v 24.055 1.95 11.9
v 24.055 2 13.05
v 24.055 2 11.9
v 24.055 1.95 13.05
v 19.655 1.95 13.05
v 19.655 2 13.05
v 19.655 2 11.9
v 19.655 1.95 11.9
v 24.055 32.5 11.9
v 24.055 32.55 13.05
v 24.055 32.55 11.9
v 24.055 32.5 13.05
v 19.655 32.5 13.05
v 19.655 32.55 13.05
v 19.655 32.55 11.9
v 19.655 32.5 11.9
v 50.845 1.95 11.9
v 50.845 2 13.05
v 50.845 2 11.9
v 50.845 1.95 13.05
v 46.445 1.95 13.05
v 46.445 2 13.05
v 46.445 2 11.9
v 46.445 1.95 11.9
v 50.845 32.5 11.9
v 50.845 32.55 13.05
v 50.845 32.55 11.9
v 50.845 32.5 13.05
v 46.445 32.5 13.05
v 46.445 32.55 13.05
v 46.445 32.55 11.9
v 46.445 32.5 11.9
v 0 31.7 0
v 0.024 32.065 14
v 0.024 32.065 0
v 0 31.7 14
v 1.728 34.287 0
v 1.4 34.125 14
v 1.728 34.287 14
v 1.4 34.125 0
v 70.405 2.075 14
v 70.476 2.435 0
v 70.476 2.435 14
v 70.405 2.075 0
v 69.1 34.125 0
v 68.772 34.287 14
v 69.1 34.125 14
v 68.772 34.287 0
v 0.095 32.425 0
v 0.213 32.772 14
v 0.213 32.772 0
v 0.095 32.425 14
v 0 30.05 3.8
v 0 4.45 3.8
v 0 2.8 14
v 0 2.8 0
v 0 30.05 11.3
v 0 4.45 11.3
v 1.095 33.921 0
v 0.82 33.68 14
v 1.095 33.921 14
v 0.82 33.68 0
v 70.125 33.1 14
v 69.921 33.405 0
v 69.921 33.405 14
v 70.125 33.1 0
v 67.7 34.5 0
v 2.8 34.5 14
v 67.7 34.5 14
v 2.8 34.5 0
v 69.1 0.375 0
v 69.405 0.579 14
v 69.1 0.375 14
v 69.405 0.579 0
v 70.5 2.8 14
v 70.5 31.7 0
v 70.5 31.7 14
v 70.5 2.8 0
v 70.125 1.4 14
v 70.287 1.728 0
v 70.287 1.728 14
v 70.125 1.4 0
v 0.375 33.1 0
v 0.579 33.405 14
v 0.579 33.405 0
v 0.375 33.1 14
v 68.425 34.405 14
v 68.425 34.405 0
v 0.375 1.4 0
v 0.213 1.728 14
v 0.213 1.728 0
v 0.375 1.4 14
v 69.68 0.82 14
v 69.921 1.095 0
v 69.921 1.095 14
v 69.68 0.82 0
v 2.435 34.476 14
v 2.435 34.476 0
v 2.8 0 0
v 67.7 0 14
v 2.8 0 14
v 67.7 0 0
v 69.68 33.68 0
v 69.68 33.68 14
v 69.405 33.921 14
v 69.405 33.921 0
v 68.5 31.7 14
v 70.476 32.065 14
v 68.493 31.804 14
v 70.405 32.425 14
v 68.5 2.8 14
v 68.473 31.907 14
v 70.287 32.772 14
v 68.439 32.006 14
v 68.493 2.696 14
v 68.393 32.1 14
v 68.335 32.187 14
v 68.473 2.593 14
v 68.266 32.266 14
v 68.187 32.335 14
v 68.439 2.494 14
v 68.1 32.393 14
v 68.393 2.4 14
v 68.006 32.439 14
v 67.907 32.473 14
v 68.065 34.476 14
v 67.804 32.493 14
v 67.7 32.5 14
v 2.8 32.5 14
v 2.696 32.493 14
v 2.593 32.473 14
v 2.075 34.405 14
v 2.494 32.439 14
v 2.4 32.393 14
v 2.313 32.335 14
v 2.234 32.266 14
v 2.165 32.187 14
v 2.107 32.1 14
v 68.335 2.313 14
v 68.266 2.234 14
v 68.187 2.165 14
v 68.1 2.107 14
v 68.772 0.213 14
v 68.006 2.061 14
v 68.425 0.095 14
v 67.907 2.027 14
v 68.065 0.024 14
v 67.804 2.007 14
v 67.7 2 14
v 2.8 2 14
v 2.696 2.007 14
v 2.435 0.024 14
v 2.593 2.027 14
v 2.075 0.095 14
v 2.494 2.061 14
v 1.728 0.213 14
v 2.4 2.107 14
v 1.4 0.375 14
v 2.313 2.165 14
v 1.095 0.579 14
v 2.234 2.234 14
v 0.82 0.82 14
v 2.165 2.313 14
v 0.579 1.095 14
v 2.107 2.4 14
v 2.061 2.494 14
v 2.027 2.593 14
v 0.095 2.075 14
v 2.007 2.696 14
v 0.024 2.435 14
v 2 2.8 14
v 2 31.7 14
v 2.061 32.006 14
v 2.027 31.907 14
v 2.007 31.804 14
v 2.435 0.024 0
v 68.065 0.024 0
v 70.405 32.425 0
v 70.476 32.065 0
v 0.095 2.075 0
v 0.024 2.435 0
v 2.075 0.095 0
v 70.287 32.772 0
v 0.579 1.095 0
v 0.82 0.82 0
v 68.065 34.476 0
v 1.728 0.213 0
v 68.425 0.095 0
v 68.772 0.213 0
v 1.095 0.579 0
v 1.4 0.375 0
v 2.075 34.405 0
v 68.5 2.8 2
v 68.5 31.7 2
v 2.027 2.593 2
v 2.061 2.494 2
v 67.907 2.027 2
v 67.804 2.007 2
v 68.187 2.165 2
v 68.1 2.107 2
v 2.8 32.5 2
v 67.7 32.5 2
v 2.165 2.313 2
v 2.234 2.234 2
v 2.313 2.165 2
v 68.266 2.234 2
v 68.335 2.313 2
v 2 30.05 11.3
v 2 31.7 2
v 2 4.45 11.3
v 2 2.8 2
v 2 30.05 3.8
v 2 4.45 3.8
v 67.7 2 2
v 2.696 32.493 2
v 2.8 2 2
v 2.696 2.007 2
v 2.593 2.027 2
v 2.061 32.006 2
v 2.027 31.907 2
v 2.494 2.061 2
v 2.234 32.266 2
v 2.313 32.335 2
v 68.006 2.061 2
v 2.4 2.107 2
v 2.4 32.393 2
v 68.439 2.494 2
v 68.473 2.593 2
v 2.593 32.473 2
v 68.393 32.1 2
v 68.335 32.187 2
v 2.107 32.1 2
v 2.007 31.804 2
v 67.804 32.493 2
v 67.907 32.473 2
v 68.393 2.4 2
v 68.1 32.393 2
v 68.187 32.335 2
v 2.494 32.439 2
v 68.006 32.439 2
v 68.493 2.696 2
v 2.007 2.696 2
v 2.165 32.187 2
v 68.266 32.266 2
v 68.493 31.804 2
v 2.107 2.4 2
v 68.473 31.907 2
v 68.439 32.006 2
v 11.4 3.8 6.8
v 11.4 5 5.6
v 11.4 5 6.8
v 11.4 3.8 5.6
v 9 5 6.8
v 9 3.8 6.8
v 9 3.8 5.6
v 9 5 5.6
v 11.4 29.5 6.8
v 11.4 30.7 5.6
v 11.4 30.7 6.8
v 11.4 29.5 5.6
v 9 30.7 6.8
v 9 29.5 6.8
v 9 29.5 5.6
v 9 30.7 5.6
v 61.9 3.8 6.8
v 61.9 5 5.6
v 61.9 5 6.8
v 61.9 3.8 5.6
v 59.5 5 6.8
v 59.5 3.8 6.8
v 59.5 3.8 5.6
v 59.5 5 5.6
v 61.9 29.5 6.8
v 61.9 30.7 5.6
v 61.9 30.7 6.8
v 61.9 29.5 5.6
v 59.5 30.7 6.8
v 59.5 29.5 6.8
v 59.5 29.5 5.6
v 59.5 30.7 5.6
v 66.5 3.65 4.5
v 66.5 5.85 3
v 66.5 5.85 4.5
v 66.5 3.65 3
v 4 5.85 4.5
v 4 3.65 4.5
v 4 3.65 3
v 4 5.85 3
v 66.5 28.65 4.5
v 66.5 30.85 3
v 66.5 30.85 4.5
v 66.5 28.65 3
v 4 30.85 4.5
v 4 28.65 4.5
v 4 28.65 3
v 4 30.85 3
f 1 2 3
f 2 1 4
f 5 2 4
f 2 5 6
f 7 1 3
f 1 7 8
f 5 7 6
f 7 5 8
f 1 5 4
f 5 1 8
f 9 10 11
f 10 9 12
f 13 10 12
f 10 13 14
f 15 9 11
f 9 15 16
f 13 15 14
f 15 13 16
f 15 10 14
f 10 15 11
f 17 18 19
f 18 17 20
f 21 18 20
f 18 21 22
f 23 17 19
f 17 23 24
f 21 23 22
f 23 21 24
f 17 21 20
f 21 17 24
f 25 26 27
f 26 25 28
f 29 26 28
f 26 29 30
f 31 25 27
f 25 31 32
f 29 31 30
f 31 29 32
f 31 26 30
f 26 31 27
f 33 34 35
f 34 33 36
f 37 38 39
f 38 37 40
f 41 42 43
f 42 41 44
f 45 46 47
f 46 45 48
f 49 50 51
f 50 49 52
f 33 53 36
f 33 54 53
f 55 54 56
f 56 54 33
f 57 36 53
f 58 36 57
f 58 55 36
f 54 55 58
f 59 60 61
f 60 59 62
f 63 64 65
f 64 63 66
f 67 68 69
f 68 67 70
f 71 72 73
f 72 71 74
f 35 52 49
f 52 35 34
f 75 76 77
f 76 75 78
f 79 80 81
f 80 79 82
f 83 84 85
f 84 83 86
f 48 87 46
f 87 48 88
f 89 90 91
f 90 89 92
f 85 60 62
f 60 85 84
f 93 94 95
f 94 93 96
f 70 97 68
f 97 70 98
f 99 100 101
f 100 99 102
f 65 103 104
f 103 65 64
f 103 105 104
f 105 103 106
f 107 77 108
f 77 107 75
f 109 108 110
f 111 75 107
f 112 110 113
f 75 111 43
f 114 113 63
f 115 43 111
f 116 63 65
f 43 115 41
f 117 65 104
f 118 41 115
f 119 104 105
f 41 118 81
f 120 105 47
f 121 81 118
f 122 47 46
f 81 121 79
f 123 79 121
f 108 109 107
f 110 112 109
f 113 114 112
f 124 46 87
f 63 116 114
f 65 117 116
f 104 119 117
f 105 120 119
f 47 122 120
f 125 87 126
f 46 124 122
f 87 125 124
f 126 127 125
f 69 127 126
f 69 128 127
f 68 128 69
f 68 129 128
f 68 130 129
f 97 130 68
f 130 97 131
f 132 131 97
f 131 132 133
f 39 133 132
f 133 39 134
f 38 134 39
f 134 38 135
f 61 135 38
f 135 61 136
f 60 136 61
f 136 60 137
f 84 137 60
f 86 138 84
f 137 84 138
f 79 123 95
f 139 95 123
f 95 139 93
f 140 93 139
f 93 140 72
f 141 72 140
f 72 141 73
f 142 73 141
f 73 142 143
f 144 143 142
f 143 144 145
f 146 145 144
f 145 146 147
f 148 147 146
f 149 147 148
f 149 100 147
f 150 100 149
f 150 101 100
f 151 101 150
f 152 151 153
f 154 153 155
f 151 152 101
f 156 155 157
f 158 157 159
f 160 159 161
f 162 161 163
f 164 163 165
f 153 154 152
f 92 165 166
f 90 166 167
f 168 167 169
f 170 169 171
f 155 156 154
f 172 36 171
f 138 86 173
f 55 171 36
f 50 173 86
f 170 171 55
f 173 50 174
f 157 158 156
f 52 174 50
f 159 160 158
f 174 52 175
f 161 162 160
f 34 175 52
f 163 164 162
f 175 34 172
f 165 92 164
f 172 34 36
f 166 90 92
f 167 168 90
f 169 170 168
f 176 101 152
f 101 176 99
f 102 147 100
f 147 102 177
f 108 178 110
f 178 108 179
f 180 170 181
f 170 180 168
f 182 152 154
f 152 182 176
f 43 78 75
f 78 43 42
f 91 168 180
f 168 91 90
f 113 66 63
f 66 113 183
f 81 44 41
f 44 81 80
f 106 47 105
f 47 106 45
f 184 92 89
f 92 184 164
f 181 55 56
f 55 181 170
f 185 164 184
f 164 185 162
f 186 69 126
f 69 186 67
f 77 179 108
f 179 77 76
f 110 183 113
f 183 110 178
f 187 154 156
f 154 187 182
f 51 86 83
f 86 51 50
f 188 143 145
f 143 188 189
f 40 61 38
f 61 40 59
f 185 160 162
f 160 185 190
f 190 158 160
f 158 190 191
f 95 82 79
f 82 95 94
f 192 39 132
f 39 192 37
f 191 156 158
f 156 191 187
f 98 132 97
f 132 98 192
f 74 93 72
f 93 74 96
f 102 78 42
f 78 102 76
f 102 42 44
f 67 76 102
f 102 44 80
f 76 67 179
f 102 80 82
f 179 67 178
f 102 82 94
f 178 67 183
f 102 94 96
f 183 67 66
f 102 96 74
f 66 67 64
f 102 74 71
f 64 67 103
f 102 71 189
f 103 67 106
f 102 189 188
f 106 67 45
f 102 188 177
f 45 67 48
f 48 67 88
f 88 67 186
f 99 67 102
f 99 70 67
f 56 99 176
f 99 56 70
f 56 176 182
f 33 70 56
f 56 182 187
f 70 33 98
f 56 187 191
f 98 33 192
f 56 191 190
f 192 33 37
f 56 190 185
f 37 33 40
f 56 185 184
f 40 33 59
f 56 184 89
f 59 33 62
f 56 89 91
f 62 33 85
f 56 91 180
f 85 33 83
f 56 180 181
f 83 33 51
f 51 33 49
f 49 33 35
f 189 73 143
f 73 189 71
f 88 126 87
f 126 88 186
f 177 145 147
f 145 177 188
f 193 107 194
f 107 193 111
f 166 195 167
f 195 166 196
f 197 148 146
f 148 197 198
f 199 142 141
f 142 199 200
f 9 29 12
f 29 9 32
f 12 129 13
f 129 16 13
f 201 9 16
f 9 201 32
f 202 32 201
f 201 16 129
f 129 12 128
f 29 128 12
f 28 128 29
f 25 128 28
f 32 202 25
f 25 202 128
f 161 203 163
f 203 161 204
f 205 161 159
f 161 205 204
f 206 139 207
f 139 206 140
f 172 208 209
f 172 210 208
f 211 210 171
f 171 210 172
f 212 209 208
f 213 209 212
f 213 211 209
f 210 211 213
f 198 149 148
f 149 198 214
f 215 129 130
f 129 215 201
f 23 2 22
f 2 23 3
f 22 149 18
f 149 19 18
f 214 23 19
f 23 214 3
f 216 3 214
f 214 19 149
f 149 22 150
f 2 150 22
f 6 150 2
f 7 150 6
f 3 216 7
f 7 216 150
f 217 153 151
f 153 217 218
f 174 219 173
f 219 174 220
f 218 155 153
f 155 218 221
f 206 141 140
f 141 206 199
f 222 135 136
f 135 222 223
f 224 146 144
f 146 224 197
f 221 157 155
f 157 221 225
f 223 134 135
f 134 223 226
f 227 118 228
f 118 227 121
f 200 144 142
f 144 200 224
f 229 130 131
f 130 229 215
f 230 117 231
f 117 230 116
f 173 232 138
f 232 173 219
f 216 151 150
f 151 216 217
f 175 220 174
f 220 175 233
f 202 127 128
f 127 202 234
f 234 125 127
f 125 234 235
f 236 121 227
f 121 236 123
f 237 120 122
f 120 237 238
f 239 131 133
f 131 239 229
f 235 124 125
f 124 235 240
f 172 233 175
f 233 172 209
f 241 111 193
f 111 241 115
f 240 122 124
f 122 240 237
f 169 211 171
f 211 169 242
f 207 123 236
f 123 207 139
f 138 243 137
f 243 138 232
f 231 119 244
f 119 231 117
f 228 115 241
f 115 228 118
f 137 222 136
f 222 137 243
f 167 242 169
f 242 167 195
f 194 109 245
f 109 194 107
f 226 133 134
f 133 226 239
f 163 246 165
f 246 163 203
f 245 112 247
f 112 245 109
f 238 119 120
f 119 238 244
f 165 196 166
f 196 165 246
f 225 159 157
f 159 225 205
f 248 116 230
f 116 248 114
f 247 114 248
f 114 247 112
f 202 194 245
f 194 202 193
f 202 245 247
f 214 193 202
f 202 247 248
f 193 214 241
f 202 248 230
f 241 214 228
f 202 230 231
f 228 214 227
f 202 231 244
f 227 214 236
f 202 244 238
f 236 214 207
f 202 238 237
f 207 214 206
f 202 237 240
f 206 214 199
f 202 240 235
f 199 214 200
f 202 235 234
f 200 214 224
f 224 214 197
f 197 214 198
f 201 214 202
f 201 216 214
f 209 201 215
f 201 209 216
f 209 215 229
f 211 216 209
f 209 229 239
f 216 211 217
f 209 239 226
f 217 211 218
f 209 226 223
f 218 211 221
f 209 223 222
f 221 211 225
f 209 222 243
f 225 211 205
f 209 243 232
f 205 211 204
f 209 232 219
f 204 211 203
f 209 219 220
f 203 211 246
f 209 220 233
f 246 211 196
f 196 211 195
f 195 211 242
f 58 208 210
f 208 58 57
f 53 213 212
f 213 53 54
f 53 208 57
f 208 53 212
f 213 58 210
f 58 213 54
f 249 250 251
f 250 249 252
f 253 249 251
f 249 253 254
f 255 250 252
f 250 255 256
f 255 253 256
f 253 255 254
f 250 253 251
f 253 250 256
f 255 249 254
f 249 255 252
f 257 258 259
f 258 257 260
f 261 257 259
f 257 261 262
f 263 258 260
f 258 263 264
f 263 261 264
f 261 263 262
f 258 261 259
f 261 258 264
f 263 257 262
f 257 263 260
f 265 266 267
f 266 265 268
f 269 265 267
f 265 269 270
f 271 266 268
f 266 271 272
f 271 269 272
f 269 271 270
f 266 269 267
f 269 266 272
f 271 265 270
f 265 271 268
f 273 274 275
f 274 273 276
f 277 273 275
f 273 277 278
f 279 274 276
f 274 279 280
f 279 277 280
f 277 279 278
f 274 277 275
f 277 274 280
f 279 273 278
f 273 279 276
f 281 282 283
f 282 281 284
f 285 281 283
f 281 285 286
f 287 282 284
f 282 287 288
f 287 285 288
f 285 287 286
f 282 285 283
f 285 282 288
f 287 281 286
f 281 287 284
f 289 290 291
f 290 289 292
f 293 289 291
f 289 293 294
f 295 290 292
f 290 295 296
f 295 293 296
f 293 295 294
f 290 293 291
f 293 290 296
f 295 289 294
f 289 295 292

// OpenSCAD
// CynusLink ESP32-S3 gateway enclosure V5
// ESP32-S3 DevKitC-1 style board
// Screwless two-piece snap fit, enlarged internal clearance.
// Units: mm

$fn = 48;
part = "base"; // "base", "lid", or "preview"

// PCB reference dimensions
pcb_l = 62.8;
pcb_w = 25.4;
pcb_t = 1.6;

// V5: V4 geometry with snap pockets raised to align with the lid bumps.
// Internal cavity is 66.5 x 30.5 mm.
inner_l = 66.5;
inner_w = 30.5;
wall = 2.0;
floor_t = 2.0;
base_h = 14.0;
corner_r = 2.8;

outer_l = inner_l + 2*wall;
outer_w = inner_w + 2*wall;

lid_t = 2.2;
lid_skirt_h = 4.0;
lid_clear = 0.30;

module rounded_box(l,w,h,r){
    hull(){
        for(x=[r,l-r], y=[r,w-r])
            translate([x,y,0]) cylinder(r=r,h=h);
    }
}

module base_shell(){
    difference(){
        rounded_box(outer_l, outer_w, base_h, corner_r);

        // Open cavity.
        translate([wall,wall,floor_t])
            rounded_box(inner_l, inner_w, base_h, max(corner_r-wall,0.7));

        // Wide end opening for the DevKitC-1 USB connector area.
        // Extra width/height gives clone boards some tolerance.
        translate([-0.2, outer_w/2-12.8, 3.8])
            cube([wall+0.7,25.6,7.5]);

        // Four snap pockets, INSIDE the long walls.
        // V5: raised to match the lid bumps. The lid bumps sit about
        // 1.15..2.00 mm below the base top edge when closed.
        // Pocket range is about 0.95..2.10 mm below the top edge,
        // giving a little vertical clearance for FDM tolerances.
        snap_pocket_z = base_h - 2.10;
        snap_pocket_h = 1.15;
        for(x=[outer_l*0.31, outer_l*0.69]){
            translate([x-2.2, wall-0.05, snap_pocket_z])
                cube([4.4,1.25,snap_pocket_h]);
            translate([x-2.2, outer_w-wall-1.20, snap_pocket_z])
                cube([4.4,1.25,snap_pocket_h]);
        }
    }

    // PCB edge rails. Their position is based on the PCB width rather than
    // the enlarged cavity width, so the wider enclosure cannot let the board fall through.
    rail_z = 3.0;
    rail_h = 1.5;
    rail_w = 2.2;
    overlap = 0.9;
    y_low = outer_w/2 - pcb_w/2 - overlap;
    y_high = outer_w/2 + pcb_w/2 - rail_w + overlap;

    translate([wall+2.0, y_low, rail_z])
        cube([inner_l-4.0, rail_w, rail_h]);
    translate([wall+2.0, y_high, rail_z])
        cube([inner_l-4.0, rail_w, rail_h]);

    // Small retainers above the PCB edge to reduce rattling.
    ret_z = rail_z + pcb_t + 1.0;
    for(x=[wall+7.0, outer_l-wall-9.0]){
        translate([x, y_low+0.15, ret_z]) cube([2.4,1.2,1.2]);
        translate([x, y_high+rail_w-1.35, ret_z]) cube([2.4,1.2,1.2]);
    }
}

module lid(){
    difference(){
        union(){
            // Top plate.
            rounded_box(outer_l, outer_w, lid_t, corner_r);

            // Internal locating skirt / lip. Interior is +Z.
            translate([wall-lid_clear, wall-lid_clear, lid_t])
            difference(){
                rounded_box(
                    inner_l+2*lid_clear,
                    inner_w+2*lid_clear,
                    lid_skirt_h,
                    max(corner_r-wall+0.35,0.9)
                );
                translate([1.30,1.30,-0.1])
                    rounded_box(
                        inner_l+2*lid_clear-2.60,
                        inner_w+2*lid_clear-2.60,
                        lid_skirt_h+0.2,
                        0.7
                    );
            }

            // Snap bumps that mate with the internal pockets in the base.
            for(x=[outer_l*0.31, outer_l*0.69]){
                translate([x-1.6, wall-lid_clear-0.42, lid_t+1.15])
                    cube([3.2,0.9,0.85]);
                translate([x-1.6, outer_w-wall+lid_clear-0.48, lid_t+1.15])
                    cube([3.2,0.9,0.85]);
            }
        }

        // Ventilation slots.
        for(i=[0:5])
            translate([outer_l-30+i*3.4, outer_w/2-7.0, -0.2])
                rounded_box(1.55,14.0,lid_t+0.4,0.6);

        // V3: engraved label on the OUTSIDE of the lid.
        // Exterior is the -Z face. Mirroring in X makes it readable when
        // looking at the exterior surface.
        translate([outer_l/2, outer_w/2, -0.05])
            linear_extrude(height=0.70)
                mirror([1,0,0])
                    text(
                        "CYNUS LINK",
                        size=5.4,
                        font="DejaVu Sans:style=Bold",
                        halign="center",
                        valign="center"
                    );
    }
}

if(part=="base") base_shell();
else if(part=="lid") lid();
else {
    color("gray") base_shell();
    translate([0,0,base_h+0.6]) color("lightgray") lid();
}
